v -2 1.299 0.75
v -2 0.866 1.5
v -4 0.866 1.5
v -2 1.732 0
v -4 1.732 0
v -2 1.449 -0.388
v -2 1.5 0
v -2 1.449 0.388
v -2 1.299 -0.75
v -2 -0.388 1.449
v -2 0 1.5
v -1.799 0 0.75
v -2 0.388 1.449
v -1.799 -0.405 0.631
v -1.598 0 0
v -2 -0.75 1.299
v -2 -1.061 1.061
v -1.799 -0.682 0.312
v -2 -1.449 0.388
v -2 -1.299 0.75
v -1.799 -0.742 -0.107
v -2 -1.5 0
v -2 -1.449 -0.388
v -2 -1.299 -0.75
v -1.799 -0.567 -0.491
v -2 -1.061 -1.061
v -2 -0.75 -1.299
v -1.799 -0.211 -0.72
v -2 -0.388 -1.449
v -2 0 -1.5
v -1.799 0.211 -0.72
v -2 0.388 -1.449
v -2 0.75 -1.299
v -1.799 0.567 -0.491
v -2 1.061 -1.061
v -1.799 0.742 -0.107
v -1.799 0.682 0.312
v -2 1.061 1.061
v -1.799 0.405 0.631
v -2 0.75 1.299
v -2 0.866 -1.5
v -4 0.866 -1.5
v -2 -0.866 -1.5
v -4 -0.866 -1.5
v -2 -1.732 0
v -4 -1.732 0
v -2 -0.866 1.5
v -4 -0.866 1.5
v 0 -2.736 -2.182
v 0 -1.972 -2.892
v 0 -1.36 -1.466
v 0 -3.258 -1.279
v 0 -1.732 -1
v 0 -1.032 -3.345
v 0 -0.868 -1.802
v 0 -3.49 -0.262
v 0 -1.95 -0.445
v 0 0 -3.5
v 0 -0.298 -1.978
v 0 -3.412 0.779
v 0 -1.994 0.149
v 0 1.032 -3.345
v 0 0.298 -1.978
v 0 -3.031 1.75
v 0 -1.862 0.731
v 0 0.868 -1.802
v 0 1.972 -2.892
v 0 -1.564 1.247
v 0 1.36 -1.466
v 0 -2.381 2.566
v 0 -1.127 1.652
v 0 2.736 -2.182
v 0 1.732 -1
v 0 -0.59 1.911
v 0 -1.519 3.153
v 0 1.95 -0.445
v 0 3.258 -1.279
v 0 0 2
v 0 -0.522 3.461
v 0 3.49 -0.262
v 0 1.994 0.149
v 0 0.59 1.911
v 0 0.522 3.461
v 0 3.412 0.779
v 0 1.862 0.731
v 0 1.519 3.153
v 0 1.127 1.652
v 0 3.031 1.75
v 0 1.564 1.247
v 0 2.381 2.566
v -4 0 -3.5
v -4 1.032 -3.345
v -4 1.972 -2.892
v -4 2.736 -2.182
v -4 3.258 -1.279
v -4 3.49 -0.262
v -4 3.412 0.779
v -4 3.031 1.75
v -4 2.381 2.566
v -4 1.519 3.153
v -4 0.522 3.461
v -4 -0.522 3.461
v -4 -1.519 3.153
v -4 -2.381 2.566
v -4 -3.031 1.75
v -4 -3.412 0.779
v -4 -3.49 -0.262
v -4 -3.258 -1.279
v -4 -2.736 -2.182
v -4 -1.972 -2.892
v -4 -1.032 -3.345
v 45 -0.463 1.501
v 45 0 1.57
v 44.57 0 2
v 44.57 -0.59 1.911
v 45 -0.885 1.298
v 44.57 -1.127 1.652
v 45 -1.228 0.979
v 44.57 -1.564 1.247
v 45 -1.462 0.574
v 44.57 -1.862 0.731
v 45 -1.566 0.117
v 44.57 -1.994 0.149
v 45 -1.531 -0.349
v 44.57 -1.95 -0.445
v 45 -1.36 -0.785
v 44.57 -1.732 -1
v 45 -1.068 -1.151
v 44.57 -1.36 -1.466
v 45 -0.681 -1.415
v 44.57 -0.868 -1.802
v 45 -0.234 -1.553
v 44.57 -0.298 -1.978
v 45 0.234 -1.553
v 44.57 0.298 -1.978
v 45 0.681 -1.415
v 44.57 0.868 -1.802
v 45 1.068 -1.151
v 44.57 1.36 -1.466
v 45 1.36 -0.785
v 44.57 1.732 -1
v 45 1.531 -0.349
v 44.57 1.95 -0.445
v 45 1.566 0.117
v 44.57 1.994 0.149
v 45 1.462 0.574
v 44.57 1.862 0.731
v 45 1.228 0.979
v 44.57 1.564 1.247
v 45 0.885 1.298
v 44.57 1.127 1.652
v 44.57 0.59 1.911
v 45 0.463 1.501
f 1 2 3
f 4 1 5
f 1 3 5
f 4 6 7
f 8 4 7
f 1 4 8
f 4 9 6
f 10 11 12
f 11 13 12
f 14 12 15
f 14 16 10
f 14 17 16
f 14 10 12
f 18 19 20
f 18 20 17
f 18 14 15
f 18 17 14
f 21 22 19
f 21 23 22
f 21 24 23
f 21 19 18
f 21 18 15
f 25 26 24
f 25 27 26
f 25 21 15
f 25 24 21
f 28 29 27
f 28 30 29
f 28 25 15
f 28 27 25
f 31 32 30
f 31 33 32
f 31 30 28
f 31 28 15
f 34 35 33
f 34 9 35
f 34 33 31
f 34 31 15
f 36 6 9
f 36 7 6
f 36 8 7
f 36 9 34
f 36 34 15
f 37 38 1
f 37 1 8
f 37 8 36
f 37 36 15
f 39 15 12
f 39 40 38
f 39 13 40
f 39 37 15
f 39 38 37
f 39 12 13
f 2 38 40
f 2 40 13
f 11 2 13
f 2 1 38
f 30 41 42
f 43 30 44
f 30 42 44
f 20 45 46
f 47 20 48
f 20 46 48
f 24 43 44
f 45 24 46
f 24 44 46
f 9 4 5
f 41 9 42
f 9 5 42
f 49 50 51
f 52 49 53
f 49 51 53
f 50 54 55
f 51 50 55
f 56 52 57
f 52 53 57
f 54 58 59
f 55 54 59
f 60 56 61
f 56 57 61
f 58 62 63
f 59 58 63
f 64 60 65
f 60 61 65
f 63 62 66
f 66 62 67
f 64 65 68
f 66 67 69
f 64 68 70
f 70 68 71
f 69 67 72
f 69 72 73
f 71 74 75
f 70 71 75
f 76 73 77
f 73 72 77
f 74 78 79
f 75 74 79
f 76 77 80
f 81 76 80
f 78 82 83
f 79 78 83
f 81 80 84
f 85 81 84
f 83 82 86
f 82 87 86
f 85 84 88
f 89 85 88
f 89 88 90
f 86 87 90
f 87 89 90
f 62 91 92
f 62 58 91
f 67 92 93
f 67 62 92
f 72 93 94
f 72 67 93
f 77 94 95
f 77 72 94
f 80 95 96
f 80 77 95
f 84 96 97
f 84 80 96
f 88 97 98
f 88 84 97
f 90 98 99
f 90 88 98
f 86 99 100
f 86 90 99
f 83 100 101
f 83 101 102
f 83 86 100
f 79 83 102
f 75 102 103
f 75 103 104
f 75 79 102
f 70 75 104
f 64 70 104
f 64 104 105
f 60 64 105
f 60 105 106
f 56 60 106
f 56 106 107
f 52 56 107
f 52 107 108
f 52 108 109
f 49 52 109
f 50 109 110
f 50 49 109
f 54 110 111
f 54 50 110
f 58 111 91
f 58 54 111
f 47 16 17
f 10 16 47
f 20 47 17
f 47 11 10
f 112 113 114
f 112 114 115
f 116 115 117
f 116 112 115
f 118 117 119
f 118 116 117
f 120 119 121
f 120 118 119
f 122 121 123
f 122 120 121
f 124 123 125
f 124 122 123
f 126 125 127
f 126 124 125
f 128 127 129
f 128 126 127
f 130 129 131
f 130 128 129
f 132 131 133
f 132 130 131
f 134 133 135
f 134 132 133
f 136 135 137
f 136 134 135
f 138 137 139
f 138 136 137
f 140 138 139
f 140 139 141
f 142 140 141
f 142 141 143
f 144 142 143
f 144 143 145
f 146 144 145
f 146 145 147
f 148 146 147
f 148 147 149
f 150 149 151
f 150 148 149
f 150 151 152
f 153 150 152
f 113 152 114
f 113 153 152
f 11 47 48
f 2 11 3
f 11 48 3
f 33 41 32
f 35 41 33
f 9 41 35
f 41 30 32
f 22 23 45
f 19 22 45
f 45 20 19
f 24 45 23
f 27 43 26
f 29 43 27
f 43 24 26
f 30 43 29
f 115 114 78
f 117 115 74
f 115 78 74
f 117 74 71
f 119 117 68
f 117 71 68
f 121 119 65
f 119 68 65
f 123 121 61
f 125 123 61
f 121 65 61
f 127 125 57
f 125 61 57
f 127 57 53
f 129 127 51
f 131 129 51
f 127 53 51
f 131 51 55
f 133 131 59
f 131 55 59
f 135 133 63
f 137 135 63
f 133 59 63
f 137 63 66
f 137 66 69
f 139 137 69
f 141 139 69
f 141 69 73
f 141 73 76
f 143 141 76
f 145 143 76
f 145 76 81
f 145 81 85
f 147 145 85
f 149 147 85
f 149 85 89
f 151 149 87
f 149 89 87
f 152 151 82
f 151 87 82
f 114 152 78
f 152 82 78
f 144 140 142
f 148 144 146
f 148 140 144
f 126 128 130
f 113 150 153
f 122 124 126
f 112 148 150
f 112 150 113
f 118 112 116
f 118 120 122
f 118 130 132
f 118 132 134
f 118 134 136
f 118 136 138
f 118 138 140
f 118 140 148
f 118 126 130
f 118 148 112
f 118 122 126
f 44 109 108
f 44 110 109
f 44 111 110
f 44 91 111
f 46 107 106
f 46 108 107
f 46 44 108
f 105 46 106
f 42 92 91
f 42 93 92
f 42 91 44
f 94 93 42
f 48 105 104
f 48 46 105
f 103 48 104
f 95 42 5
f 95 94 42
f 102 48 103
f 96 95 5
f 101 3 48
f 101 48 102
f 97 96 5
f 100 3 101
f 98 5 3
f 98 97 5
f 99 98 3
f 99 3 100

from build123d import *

# Parameters (mm, degrees)
SKETCH1_W           = 4
SKETCH1_H           = 3.5
SKETCH2_R           = 2
BOSS_EXTRUDE1_DEPTH = 45
CUT_EXTRUDE1_DEPTH  = 2
CHAMFER1_SIZE       = 0.4295


with BuildPart() as part:
    # Sketch1 → Revolve1 (revolve)
    with BuildSketch(Plane.XY, mode=Mode.PRIVATE) as revolve1_sk:
        with Locations((-2, 1.75)):
            Rectangle(SKETCH1_W, SKETCH1_H)
    revolve(revolve1_sk.sketch.rotate(Axis((-4, 0, 0), (1, 0, 0)), 270), axis=Axis((-4, 0, 0), (1, 0, 0)))

    # Sketch2 → Boss-Extrude1 (add)
    with BuildSketch(Plane(origin=(0, 0, 0), x_dir=(0, 0, -1), z_dir=(1, 0, 0))):
        with Locations(Location((0, 0, 0), (0, 0, 180))):
            Circle(SKETCH2_R)
    extrude(amount=BOSS_EXTRUDE1_DEPTH)

    # Sketch3 → Cut-Extrude1 (cut)
    with BuildSketch(Plane.ZY.offset(4)):
        Polygon((1.5, -0.866025404), (1.5, 0.866025404), (0, 1.732050808), (-1.5, 0.866025404), (-1.5, -0.866025404), (0, -1.732050808), align=None)
    extrude(amount=-CUT_EXTRUDE1_DEPTH, mode=Mode.SUBTRACT)

    # Sketch4 → Cut-Revolve1 (revolve, cut)
    with BuildSketch(Plane.XY, mode=Mode.PRIVATE) as cut_revolve1_sk:
        Polygon((-2, 1.5), (-2, 0), (-1.598076211, 0), align=None)
    revolve(cut_revolve1_sk.sketch.rotate(Axis((-2.000025, 0, 0), (1, 0, 0)), 90), axis=Axis((-2.000025, 0, 0), (1, 0, 0)), mode=Mode.SUBTRACT)

    # Chamfer1
    chamfer1_edges = [part.edges().sort_by_distance(p)[0] for p in [
        (45, 0, -2),
    ]]
    chamfer(chamfer1_edges, length=CHAMFER1_SIZE)


solid = part.part
